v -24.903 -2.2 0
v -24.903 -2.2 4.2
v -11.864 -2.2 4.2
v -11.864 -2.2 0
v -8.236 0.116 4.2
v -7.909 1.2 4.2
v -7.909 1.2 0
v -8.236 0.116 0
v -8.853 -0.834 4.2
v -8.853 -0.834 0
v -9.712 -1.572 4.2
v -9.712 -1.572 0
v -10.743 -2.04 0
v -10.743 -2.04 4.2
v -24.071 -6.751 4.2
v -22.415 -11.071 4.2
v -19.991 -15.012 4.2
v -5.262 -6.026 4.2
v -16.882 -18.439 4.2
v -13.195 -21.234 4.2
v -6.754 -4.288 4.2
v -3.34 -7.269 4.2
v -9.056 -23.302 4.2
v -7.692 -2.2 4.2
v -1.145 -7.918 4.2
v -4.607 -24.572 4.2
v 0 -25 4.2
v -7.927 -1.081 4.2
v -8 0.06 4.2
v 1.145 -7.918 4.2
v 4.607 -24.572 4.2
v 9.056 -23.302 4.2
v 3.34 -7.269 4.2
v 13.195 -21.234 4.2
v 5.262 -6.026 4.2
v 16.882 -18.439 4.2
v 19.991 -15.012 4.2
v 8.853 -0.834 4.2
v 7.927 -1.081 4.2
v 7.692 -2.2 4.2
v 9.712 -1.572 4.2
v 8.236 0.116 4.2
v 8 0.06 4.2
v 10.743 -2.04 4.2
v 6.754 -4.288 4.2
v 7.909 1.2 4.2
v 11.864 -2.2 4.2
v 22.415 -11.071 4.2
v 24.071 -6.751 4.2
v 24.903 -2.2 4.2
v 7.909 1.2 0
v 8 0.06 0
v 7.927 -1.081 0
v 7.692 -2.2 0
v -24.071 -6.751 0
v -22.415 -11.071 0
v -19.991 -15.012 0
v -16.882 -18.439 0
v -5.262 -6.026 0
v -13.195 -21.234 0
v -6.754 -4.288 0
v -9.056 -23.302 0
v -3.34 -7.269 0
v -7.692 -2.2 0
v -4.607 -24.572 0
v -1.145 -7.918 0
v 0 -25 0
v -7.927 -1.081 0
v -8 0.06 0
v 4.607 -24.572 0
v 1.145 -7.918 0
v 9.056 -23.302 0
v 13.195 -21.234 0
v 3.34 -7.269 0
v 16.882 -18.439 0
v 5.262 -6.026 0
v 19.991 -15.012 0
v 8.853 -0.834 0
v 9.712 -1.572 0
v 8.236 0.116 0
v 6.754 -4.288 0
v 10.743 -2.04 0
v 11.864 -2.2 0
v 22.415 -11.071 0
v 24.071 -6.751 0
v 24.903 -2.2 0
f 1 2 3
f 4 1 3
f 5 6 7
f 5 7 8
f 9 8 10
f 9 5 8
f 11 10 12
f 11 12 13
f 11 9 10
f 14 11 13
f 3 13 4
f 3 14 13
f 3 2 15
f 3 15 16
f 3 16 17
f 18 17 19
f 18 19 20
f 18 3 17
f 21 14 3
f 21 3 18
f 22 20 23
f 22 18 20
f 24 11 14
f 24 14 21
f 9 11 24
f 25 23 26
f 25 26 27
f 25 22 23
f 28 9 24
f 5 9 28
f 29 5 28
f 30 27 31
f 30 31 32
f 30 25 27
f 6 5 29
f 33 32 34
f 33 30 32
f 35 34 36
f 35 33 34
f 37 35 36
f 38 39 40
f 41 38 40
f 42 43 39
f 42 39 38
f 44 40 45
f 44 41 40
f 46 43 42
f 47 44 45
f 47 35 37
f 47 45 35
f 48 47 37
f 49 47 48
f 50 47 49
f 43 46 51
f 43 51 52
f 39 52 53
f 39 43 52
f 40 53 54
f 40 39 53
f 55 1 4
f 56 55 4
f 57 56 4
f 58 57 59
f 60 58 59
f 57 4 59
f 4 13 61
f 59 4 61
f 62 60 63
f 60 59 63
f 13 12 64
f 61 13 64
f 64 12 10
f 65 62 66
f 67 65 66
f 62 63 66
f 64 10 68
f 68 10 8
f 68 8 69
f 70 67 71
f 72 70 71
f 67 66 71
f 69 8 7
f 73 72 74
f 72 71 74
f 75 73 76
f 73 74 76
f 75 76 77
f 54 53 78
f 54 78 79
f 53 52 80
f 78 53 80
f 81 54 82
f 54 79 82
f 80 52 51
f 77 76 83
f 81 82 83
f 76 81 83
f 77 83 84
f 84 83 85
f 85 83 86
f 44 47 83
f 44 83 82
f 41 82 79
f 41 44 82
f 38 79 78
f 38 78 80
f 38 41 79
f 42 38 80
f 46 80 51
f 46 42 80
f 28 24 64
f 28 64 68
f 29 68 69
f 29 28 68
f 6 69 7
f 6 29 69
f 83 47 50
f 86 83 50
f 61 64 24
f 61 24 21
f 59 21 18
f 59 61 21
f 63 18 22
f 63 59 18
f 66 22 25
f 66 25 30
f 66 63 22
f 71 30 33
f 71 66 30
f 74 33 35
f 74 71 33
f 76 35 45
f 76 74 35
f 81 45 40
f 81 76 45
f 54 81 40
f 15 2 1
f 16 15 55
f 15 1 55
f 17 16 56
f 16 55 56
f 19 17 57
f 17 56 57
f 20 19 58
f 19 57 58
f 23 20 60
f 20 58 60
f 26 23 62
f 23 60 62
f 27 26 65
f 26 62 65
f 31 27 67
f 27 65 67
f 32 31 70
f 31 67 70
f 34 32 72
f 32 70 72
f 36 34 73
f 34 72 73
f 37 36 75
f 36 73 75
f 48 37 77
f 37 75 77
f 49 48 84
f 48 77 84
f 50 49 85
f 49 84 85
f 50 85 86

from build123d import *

# Parameters (mm, degrees)
SKETCH1_R           = 25
SKETCH1_R_2         = 8
BASE_EXTRUDE_DEPTH  = 4.2
CUT_EXTRUDE1_DEPTH  = 5.2
BOSS_EXTRUDE1_DEPTH = 4.2


with BuildPart() as part:
    # Sketch1 → Base-Extrude (new body)
    with BuildSketch(Plane.XY):
        Circle(SKETCH1_R)
        Circle(SKETCH1_R_2, mode=Mode.SUBTRACT)
    extrude(amount=BASE_EXTRUDE_DEPTH)

    # Sketch2 → Cut-Extrude1 (cut, through all)
    with BuildSketch(Plane.XY.offset(4.2)):
        Polygon((-31.283198073, -2.2), (32.499555714, -2.2), (32.499555714, 32.618237466), (-31.739332188, 32.618237466), align=None)
    extrude(amount=-CUT_EXTRUDE1_DEPTH, mode=Mode.SUBTRACT)

    # Sketch3 → Boss-Extrude1 (add)
    with BuildSketch(Plane.XY.offset(4.2)):
        with BuildLine():
            Line((7.691553809, -2.2), (11.86423196, -2.2))
            ThreePointArc((11.86423196, -2.2), (9.256550998, -1.233150178), (7.909487973, 1.2))
            ThreePointArc((7.909487973, 1.2), (7.983616109, -0.511736089), (7.691553809, -2.2))
        make_face()
        with BuildLine():
            Line((-11.86423196, -2.2), (-7.691553809, -2.2))
            ThreePointArc((-7.691553809, -2.2), (-7.983616109, -0.511736089), (-7.909487973, 1.2))
            ThreePointArc((-7.909487973, 1.2), (-9.256550998, -1.233150178), (-11.86423196, -2.2))
        make_face()
    extrude(amount=-BOSS_EXTRUDE1_DEPTH)


solid = part.part
